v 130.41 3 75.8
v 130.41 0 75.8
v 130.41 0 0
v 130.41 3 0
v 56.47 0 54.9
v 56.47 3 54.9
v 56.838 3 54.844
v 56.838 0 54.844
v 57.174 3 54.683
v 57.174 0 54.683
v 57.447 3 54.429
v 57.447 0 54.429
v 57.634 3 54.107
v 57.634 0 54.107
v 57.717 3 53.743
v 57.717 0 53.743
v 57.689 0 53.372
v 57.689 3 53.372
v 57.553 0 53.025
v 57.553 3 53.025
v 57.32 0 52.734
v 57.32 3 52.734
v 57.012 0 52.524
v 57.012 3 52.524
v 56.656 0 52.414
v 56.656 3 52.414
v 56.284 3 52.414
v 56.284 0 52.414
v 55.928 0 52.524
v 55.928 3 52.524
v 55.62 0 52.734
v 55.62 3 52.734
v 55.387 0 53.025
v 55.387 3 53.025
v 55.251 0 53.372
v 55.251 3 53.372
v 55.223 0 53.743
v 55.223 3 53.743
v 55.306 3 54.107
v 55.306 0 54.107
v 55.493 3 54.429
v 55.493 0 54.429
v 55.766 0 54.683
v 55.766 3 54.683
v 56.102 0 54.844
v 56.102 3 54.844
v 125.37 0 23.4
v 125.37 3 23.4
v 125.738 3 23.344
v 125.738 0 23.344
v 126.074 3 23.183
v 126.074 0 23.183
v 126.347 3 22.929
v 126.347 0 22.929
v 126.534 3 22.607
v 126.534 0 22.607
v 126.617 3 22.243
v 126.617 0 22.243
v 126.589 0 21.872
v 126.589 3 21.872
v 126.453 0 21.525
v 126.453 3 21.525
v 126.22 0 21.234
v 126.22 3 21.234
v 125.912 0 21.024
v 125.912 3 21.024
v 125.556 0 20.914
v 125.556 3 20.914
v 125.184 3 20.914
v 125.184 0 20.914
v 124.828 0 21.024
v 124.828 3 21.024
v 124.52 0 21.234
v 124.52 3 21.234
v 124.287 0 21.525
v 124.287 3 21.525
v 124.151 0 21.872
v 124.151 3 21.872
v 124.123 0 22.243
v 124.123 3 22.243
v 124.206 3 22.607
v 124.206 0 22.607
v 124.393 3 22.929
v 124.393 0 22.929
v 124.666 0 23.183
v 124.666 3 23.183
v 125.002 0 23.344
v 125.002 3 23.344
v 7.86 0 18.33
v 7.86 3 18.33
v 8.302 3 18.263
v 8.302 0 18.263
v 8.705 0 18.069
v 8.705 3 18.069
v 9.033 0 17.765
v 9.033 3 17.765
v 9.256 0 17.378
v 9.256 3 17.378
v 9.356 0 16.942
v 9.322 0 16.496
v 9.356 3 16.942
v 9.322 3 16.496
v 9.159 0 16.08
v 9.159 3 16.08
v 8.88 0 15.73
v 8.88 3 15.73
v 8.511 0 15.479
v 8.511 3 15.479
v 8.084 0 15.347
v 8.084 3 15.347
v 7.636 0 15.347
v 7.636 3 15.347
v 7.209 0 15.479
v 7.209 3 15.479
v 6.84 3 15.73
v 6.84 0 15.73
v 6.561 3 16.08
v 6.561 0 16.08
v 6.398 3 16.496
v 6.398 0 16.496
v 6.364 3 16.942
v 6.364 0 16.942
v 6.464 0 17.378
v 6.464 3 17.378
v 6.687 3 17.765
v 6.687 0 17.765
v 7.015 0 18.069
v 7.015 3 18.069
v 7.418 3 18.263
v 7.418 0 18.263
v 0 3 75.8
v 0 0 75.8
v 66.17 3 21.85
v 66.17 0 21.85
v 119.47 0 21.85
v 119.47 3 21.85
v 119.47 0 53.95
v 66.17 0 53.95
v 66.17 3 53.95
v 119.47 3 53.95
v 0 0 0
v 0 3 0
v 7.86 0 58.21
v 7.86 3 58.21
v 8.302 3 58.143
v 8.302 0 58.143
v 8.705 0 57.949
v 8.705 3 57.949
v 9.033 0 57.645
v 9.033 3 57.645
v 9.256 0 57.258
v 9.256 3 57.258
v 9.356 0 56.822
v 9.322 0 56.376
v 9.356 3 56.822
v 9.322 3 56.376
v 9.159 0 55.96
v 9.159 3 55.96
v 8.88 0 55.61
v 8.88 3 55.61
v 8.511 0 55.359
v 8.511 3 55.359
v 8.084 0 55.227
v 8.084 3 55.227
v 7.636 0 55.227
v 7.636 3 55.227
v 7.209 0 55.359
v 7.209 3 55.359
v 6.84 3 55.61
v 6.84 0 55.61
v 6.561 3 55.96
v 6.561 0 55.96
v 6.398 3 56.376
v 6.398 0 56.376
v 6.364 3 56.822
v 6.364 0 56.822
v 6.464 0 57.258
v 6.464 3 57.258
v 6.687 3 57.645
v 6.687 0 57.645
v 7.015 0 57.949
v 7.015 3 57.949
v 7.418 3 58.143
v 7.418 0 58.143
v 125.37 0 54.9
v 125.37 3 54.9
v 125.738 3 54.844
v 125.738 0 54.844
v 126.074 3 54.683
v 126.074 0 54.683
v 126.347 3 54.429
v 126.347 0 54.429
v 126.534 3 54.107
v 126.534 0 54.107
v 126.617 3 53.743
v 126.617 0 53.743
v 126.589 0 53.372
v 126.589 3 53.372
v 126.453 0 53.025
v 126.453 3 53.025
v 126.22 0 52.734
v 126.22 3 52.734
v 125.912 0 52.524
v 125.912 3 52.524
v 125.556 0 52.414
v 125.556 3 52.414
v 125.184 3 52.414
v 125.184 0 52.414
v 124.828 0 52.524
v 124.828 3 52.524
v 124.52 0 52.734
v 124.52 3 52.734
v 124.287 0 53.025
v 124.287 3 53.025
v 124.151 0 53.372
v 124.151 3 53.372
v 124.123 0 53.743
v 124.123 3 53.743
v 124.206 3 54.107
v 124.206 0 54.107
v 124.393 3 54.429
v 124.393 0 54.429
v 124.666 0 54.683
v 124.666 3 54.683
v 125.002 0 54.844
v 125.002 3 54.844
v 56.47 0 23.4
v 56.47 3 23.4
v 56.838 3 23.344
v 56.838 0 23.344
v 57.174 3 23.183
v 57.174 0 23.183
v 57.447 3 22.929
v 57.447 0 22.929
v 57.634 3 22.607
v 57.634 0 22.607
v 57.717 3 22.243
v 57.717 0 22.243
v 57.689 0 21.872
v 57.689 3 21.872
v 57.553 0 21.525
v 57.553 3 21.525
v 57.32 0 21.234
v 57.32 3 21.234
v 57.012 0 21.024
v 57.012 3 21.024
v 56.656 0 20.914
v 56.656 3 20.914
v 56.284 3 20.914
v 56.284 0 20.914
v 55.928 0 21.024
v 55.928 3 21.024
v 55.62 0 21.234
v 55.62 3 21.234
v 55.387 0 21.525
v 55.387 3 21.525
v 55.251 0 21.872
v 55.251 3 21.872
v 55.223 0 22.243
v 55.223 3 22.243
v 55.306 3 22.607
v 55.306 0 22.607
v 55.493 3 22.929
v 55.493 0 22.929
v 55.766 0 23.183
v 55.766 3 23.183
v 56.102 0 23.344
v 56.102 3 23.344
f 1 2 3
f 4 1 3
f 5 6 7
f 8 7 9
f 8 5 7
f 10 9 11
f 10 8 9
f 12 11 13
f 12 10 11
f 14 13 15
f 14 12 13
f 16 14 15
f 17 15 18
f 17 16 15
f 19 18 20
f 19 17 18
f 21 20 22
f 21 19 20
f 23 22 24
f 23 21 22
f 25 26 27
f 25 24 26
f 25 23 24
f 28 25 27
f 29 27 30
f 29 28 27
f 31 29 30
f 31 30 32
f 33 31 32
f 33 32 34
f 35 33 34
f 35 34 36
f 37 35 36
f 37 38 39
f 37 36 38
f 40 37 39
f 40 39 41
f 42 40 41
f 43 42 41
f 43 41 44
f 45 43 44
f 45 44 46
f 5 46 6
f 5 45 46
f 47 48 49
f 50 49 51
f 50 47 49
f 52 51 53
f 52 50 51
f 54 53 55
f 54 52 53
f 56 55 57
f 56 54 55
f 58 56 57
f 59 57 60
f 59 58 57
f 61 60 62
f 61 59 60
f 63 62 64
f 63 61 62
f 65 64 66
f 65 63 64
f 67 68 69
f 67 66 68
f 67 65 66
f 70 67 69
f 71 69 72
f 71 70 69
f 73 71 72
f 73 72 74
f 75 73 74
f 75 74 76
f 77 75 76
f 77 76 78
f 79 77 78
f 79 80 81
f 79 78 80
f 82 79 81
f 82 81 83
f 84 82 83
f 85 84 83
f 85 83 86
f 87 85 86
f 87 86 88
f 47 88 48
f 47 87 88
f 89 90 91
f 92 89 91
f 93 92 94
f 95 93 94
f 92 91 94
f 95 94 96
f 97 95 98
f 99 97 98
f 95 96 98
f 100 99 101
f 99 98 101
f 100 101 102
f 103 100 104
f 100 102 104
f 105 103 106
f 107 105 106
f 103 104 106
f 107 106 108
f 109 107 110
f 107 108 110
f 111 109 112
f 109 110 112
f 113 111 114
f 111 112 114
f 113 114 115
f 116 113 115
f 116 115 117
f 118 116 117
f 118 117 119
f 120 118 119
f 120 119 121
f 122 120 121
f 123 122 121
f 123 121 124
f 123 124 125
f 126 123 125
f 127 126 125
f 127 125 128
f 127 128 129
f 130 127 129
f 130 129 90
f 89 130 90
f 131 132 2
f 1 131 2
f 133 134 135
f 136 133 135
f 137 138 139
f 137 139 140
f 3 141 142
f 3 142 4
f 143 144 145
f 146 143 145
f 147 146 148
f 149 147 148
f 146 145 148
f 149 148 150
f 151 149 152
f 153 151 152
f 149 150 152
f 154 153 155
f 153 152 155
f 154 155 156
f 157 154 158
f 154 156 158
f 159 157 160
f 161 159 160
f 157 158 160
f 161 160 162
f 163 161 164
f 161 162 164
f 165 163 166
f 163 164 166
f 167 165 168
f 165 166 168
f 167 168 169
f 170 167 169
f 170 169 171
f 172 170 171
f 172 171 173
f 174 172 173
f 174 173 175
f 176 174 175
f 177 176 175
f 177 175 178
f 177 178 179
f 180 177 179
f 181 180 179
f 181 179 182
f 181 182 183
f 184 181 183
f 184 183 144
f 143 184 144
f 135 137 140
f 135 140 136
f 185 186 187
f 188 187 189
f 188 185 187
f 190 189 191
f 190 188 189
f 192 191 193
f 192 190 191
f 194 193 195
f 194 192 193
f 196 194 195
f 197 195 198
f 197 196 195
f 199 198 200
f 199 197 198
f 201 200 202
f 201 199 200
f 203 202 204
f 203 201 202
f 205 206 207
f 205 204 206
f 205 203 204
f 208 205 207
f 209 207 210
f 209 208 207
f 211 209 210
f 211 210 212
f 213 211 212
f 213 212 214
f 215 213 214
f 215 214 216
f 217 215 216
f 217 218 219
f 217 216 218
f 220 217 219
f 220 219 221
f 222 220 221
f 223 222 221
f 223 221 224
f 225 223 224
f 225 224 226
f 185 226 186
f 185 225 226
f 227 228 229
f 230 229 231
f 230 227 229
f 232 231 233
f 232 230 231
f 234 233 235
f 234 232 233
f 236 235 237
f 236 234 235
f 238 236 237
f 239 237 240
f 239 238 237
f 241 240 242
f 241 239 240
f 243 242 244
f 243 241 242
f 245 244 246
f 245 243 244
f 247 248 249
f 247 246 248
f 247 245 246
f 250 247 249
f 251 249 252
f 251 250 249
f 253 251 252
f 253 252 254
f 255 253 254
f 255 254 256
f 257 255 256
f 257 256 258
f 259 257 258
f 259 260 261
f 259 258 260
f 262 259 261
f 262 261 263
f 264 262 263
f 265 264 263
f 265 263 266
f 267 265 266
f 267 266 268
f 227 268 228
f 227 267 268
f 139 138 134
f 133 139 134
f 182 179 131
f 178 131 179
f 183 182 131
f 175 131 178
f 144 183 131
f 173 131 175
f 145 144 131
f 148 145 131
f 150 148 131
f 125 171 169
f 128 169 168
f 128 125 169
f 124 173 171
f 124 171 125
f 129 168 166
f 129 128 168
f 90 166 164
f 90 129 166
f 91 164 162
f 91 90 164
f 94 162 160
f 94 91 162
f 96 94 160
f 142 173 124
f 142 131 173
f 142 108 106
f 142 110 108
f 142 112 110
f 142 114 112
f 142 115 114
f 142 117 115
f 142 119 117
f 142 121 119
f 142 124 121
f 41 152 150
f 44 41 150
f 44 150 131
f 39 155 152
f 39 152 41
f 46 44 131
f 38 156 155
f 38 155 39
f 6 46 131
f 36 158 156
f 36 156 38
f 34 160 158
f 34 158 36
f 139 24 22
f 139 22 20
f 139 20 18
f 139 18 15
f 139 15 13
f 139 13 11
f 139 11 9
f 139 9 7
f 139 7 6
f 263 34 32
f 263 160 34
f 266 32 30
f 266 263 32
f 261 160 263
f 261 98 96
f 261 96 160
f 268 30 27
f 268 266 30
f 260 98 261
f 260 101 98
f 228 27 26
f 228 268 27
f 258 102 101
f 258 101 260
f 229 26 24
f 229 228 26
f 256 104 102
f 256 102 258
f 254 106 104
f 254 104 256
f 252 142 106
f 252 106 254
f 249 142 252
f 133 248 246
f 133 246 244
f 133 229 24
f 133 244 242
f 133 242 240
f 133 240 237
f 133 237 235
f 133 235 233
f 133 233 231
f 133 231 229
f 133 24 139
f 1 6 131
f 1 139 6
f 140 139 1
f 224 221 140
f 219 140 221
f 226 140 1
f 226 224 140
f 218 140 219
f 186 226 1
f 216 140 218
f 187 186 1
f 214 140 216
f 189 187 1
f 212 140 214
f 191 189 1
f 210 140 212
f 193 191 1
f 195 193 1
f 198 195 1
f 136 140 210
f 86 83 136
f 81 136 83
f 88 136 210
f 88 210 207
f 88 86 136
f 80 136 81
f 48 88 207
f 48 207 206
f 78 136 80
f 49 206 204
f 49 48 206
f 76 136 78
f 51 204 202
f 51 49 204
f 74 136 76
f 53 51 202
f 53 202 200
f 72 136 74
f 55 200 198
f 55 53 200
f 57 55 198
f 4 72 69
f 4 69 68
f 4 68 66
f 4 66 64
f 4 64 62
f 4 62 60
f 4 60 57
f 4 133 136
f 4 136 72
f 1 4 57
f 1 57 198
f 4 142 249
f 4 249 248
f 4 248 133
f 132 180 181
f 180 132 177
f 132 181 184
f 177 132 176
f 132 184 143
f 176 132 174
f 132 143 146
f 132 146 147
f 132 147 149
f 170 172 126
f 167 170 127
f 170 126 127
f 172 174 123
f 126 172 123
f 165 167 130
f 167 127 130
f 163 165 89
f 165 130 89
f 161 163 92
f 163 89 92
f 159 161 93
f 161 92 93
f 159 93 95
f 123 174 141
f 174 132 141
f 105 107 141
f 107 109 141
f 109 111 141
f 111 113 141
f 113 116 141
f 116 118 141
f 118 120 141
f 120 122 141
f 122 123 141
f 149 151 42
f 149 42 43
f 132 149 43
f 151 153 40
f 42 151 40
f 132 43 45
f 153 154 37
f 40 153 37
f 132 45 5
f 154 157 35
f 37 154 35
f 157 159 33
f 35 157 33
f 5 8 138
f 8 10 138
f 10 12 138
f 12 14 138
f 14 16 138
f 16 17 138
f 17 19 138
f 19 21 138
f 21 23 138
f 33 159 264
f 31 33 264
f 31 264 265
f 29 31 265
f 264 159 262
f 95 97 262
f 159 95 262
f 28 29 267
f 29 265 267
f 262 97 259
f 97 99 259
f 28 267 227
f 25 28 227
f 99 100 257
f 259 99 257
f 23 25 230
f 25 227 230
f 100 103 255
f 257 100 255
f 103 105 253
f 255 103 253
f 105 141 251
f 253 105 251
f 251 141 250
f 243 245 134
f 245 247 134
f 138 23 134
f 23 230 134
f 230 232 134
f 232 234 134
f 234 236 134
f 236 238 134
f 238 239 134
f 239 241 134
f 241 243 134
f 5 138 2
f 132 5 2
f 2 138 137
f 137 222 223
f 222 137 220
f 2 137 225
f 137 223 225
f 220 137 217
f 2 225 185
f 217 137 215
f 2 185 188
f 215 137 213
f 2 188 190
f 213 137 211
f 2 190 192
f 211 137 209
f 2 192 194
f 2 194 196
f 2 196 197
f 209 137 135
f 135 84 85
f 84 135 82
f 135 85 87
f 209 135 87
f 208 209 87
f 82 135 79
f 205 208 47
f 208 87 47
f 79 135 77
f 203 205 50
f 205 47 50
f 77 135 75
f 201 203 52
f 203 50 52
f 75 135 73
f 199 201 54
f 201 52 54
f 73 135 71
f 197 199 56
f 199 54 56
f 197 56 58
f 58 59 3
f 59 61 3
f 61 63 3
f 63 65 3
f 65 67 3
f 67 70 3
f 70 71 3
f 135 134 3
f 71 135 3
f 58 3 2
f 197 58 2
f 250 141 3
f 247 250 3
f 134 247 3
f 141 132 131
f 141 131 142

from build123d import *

# Parameters (mm, degrees)
SKETCH1_W           = 130.41
SKETCH1_H           = 75.8
BOSS_EXTRUDE1_DEPTH = 3
SKETCH1_4_W         = 53.3
SKETCH1_4_H         = 32.1
CUT_EXTRUDE2_DEPTH  = 151.868844033
SKETCH1_5_R         = 1.25
CUT_EXTRUDE3_DEPTH  = 151.868844033
SKETCH2_R           = 1.5
CUT_EXTRUDE4_DEPTH  = 151.868844033
SKETCH3_R           = 1.5
CUT_EXTRUDE5_DEPTH  = 151.868844033


with BuildPart() as part:
    # Sketch1 → Boss-Extrude1 (new body)
    with BuildSketch(Plane(origin=(0, 0, 0), x_dir=(1, 0, 0), z_dir=(0, 1, 0))):
        with Locations((65.205, -37.9)):
            Rectangle(SKETCH1_W, SKETCH1_H)
    extrude(amount=BOSS_EXTRUDE1_DEPTH)

    # Sketch1<4> → Cut-Extrude2 (cut, through all)
    with BuildSketch(Plane(origin=(0, 0, 0), x_dir=(1, 0, 0), z_dir=(0, 1, 0))):
        with Locations((92.82, -37.9)):
            Rectangle(SKETCH1_4_W, SKETCH1_4_H)
    extrude(amount=CUT_EXTRUDE2_DEPTH, mode=Mode.SUBTRACT)

    # Sketch1<5> → Cut-Extrude3 (cut, through all)
    with BuildSketch(Plane(origin=(0, 0, 0), x_dir=(1, 0, 0), z_dir=(0, 1, 0))):
        with Locations((56.47, -22.15)):
            Circle(SKETCH1_5_R)
        with Locations((125.37, -22.15)):
            Circle(SKETCH1_5_R)
        with Locations((125.37, -53.65)):
            Circle(SKETCH1_5_R)
        with Locations((56.47, -53.65)):
            Circle(SKETCH1_5_R)
    extrude(amount=CUT_EXTRUDE3_DEPTH, mode=Mode.SUBTRACT)

    # Sketch2 → Cut-Extrude4 (cut, through all)
    with BuildSketch(Plane(origin=(0, 3, 0), x_dir=(1, 0, 0), z_dir=(0, 1, 0))):
        with Locations((7.86, -16.83)):
            Circle(SKETCH2_R)
    extrude(amount=-CUT_EXTRUDE4_DEPTH, mode=Mode.SUBTRACT)

    # Sketch3 → Cut-Extrude5 (cut, through all)
    with BuildSketch(Plane(origin=(0, 3, 0), x_dir=(1, 0, 0), z_dir=(0, 1, 0))):
        with Locations((7.86, -56.71)):
            Circle(SKETCH3_R)
    extrude(amount=-CUT_EXTRUDE5_DEPTH, mode=Mode.SUBTRACT)


solid = part.part
